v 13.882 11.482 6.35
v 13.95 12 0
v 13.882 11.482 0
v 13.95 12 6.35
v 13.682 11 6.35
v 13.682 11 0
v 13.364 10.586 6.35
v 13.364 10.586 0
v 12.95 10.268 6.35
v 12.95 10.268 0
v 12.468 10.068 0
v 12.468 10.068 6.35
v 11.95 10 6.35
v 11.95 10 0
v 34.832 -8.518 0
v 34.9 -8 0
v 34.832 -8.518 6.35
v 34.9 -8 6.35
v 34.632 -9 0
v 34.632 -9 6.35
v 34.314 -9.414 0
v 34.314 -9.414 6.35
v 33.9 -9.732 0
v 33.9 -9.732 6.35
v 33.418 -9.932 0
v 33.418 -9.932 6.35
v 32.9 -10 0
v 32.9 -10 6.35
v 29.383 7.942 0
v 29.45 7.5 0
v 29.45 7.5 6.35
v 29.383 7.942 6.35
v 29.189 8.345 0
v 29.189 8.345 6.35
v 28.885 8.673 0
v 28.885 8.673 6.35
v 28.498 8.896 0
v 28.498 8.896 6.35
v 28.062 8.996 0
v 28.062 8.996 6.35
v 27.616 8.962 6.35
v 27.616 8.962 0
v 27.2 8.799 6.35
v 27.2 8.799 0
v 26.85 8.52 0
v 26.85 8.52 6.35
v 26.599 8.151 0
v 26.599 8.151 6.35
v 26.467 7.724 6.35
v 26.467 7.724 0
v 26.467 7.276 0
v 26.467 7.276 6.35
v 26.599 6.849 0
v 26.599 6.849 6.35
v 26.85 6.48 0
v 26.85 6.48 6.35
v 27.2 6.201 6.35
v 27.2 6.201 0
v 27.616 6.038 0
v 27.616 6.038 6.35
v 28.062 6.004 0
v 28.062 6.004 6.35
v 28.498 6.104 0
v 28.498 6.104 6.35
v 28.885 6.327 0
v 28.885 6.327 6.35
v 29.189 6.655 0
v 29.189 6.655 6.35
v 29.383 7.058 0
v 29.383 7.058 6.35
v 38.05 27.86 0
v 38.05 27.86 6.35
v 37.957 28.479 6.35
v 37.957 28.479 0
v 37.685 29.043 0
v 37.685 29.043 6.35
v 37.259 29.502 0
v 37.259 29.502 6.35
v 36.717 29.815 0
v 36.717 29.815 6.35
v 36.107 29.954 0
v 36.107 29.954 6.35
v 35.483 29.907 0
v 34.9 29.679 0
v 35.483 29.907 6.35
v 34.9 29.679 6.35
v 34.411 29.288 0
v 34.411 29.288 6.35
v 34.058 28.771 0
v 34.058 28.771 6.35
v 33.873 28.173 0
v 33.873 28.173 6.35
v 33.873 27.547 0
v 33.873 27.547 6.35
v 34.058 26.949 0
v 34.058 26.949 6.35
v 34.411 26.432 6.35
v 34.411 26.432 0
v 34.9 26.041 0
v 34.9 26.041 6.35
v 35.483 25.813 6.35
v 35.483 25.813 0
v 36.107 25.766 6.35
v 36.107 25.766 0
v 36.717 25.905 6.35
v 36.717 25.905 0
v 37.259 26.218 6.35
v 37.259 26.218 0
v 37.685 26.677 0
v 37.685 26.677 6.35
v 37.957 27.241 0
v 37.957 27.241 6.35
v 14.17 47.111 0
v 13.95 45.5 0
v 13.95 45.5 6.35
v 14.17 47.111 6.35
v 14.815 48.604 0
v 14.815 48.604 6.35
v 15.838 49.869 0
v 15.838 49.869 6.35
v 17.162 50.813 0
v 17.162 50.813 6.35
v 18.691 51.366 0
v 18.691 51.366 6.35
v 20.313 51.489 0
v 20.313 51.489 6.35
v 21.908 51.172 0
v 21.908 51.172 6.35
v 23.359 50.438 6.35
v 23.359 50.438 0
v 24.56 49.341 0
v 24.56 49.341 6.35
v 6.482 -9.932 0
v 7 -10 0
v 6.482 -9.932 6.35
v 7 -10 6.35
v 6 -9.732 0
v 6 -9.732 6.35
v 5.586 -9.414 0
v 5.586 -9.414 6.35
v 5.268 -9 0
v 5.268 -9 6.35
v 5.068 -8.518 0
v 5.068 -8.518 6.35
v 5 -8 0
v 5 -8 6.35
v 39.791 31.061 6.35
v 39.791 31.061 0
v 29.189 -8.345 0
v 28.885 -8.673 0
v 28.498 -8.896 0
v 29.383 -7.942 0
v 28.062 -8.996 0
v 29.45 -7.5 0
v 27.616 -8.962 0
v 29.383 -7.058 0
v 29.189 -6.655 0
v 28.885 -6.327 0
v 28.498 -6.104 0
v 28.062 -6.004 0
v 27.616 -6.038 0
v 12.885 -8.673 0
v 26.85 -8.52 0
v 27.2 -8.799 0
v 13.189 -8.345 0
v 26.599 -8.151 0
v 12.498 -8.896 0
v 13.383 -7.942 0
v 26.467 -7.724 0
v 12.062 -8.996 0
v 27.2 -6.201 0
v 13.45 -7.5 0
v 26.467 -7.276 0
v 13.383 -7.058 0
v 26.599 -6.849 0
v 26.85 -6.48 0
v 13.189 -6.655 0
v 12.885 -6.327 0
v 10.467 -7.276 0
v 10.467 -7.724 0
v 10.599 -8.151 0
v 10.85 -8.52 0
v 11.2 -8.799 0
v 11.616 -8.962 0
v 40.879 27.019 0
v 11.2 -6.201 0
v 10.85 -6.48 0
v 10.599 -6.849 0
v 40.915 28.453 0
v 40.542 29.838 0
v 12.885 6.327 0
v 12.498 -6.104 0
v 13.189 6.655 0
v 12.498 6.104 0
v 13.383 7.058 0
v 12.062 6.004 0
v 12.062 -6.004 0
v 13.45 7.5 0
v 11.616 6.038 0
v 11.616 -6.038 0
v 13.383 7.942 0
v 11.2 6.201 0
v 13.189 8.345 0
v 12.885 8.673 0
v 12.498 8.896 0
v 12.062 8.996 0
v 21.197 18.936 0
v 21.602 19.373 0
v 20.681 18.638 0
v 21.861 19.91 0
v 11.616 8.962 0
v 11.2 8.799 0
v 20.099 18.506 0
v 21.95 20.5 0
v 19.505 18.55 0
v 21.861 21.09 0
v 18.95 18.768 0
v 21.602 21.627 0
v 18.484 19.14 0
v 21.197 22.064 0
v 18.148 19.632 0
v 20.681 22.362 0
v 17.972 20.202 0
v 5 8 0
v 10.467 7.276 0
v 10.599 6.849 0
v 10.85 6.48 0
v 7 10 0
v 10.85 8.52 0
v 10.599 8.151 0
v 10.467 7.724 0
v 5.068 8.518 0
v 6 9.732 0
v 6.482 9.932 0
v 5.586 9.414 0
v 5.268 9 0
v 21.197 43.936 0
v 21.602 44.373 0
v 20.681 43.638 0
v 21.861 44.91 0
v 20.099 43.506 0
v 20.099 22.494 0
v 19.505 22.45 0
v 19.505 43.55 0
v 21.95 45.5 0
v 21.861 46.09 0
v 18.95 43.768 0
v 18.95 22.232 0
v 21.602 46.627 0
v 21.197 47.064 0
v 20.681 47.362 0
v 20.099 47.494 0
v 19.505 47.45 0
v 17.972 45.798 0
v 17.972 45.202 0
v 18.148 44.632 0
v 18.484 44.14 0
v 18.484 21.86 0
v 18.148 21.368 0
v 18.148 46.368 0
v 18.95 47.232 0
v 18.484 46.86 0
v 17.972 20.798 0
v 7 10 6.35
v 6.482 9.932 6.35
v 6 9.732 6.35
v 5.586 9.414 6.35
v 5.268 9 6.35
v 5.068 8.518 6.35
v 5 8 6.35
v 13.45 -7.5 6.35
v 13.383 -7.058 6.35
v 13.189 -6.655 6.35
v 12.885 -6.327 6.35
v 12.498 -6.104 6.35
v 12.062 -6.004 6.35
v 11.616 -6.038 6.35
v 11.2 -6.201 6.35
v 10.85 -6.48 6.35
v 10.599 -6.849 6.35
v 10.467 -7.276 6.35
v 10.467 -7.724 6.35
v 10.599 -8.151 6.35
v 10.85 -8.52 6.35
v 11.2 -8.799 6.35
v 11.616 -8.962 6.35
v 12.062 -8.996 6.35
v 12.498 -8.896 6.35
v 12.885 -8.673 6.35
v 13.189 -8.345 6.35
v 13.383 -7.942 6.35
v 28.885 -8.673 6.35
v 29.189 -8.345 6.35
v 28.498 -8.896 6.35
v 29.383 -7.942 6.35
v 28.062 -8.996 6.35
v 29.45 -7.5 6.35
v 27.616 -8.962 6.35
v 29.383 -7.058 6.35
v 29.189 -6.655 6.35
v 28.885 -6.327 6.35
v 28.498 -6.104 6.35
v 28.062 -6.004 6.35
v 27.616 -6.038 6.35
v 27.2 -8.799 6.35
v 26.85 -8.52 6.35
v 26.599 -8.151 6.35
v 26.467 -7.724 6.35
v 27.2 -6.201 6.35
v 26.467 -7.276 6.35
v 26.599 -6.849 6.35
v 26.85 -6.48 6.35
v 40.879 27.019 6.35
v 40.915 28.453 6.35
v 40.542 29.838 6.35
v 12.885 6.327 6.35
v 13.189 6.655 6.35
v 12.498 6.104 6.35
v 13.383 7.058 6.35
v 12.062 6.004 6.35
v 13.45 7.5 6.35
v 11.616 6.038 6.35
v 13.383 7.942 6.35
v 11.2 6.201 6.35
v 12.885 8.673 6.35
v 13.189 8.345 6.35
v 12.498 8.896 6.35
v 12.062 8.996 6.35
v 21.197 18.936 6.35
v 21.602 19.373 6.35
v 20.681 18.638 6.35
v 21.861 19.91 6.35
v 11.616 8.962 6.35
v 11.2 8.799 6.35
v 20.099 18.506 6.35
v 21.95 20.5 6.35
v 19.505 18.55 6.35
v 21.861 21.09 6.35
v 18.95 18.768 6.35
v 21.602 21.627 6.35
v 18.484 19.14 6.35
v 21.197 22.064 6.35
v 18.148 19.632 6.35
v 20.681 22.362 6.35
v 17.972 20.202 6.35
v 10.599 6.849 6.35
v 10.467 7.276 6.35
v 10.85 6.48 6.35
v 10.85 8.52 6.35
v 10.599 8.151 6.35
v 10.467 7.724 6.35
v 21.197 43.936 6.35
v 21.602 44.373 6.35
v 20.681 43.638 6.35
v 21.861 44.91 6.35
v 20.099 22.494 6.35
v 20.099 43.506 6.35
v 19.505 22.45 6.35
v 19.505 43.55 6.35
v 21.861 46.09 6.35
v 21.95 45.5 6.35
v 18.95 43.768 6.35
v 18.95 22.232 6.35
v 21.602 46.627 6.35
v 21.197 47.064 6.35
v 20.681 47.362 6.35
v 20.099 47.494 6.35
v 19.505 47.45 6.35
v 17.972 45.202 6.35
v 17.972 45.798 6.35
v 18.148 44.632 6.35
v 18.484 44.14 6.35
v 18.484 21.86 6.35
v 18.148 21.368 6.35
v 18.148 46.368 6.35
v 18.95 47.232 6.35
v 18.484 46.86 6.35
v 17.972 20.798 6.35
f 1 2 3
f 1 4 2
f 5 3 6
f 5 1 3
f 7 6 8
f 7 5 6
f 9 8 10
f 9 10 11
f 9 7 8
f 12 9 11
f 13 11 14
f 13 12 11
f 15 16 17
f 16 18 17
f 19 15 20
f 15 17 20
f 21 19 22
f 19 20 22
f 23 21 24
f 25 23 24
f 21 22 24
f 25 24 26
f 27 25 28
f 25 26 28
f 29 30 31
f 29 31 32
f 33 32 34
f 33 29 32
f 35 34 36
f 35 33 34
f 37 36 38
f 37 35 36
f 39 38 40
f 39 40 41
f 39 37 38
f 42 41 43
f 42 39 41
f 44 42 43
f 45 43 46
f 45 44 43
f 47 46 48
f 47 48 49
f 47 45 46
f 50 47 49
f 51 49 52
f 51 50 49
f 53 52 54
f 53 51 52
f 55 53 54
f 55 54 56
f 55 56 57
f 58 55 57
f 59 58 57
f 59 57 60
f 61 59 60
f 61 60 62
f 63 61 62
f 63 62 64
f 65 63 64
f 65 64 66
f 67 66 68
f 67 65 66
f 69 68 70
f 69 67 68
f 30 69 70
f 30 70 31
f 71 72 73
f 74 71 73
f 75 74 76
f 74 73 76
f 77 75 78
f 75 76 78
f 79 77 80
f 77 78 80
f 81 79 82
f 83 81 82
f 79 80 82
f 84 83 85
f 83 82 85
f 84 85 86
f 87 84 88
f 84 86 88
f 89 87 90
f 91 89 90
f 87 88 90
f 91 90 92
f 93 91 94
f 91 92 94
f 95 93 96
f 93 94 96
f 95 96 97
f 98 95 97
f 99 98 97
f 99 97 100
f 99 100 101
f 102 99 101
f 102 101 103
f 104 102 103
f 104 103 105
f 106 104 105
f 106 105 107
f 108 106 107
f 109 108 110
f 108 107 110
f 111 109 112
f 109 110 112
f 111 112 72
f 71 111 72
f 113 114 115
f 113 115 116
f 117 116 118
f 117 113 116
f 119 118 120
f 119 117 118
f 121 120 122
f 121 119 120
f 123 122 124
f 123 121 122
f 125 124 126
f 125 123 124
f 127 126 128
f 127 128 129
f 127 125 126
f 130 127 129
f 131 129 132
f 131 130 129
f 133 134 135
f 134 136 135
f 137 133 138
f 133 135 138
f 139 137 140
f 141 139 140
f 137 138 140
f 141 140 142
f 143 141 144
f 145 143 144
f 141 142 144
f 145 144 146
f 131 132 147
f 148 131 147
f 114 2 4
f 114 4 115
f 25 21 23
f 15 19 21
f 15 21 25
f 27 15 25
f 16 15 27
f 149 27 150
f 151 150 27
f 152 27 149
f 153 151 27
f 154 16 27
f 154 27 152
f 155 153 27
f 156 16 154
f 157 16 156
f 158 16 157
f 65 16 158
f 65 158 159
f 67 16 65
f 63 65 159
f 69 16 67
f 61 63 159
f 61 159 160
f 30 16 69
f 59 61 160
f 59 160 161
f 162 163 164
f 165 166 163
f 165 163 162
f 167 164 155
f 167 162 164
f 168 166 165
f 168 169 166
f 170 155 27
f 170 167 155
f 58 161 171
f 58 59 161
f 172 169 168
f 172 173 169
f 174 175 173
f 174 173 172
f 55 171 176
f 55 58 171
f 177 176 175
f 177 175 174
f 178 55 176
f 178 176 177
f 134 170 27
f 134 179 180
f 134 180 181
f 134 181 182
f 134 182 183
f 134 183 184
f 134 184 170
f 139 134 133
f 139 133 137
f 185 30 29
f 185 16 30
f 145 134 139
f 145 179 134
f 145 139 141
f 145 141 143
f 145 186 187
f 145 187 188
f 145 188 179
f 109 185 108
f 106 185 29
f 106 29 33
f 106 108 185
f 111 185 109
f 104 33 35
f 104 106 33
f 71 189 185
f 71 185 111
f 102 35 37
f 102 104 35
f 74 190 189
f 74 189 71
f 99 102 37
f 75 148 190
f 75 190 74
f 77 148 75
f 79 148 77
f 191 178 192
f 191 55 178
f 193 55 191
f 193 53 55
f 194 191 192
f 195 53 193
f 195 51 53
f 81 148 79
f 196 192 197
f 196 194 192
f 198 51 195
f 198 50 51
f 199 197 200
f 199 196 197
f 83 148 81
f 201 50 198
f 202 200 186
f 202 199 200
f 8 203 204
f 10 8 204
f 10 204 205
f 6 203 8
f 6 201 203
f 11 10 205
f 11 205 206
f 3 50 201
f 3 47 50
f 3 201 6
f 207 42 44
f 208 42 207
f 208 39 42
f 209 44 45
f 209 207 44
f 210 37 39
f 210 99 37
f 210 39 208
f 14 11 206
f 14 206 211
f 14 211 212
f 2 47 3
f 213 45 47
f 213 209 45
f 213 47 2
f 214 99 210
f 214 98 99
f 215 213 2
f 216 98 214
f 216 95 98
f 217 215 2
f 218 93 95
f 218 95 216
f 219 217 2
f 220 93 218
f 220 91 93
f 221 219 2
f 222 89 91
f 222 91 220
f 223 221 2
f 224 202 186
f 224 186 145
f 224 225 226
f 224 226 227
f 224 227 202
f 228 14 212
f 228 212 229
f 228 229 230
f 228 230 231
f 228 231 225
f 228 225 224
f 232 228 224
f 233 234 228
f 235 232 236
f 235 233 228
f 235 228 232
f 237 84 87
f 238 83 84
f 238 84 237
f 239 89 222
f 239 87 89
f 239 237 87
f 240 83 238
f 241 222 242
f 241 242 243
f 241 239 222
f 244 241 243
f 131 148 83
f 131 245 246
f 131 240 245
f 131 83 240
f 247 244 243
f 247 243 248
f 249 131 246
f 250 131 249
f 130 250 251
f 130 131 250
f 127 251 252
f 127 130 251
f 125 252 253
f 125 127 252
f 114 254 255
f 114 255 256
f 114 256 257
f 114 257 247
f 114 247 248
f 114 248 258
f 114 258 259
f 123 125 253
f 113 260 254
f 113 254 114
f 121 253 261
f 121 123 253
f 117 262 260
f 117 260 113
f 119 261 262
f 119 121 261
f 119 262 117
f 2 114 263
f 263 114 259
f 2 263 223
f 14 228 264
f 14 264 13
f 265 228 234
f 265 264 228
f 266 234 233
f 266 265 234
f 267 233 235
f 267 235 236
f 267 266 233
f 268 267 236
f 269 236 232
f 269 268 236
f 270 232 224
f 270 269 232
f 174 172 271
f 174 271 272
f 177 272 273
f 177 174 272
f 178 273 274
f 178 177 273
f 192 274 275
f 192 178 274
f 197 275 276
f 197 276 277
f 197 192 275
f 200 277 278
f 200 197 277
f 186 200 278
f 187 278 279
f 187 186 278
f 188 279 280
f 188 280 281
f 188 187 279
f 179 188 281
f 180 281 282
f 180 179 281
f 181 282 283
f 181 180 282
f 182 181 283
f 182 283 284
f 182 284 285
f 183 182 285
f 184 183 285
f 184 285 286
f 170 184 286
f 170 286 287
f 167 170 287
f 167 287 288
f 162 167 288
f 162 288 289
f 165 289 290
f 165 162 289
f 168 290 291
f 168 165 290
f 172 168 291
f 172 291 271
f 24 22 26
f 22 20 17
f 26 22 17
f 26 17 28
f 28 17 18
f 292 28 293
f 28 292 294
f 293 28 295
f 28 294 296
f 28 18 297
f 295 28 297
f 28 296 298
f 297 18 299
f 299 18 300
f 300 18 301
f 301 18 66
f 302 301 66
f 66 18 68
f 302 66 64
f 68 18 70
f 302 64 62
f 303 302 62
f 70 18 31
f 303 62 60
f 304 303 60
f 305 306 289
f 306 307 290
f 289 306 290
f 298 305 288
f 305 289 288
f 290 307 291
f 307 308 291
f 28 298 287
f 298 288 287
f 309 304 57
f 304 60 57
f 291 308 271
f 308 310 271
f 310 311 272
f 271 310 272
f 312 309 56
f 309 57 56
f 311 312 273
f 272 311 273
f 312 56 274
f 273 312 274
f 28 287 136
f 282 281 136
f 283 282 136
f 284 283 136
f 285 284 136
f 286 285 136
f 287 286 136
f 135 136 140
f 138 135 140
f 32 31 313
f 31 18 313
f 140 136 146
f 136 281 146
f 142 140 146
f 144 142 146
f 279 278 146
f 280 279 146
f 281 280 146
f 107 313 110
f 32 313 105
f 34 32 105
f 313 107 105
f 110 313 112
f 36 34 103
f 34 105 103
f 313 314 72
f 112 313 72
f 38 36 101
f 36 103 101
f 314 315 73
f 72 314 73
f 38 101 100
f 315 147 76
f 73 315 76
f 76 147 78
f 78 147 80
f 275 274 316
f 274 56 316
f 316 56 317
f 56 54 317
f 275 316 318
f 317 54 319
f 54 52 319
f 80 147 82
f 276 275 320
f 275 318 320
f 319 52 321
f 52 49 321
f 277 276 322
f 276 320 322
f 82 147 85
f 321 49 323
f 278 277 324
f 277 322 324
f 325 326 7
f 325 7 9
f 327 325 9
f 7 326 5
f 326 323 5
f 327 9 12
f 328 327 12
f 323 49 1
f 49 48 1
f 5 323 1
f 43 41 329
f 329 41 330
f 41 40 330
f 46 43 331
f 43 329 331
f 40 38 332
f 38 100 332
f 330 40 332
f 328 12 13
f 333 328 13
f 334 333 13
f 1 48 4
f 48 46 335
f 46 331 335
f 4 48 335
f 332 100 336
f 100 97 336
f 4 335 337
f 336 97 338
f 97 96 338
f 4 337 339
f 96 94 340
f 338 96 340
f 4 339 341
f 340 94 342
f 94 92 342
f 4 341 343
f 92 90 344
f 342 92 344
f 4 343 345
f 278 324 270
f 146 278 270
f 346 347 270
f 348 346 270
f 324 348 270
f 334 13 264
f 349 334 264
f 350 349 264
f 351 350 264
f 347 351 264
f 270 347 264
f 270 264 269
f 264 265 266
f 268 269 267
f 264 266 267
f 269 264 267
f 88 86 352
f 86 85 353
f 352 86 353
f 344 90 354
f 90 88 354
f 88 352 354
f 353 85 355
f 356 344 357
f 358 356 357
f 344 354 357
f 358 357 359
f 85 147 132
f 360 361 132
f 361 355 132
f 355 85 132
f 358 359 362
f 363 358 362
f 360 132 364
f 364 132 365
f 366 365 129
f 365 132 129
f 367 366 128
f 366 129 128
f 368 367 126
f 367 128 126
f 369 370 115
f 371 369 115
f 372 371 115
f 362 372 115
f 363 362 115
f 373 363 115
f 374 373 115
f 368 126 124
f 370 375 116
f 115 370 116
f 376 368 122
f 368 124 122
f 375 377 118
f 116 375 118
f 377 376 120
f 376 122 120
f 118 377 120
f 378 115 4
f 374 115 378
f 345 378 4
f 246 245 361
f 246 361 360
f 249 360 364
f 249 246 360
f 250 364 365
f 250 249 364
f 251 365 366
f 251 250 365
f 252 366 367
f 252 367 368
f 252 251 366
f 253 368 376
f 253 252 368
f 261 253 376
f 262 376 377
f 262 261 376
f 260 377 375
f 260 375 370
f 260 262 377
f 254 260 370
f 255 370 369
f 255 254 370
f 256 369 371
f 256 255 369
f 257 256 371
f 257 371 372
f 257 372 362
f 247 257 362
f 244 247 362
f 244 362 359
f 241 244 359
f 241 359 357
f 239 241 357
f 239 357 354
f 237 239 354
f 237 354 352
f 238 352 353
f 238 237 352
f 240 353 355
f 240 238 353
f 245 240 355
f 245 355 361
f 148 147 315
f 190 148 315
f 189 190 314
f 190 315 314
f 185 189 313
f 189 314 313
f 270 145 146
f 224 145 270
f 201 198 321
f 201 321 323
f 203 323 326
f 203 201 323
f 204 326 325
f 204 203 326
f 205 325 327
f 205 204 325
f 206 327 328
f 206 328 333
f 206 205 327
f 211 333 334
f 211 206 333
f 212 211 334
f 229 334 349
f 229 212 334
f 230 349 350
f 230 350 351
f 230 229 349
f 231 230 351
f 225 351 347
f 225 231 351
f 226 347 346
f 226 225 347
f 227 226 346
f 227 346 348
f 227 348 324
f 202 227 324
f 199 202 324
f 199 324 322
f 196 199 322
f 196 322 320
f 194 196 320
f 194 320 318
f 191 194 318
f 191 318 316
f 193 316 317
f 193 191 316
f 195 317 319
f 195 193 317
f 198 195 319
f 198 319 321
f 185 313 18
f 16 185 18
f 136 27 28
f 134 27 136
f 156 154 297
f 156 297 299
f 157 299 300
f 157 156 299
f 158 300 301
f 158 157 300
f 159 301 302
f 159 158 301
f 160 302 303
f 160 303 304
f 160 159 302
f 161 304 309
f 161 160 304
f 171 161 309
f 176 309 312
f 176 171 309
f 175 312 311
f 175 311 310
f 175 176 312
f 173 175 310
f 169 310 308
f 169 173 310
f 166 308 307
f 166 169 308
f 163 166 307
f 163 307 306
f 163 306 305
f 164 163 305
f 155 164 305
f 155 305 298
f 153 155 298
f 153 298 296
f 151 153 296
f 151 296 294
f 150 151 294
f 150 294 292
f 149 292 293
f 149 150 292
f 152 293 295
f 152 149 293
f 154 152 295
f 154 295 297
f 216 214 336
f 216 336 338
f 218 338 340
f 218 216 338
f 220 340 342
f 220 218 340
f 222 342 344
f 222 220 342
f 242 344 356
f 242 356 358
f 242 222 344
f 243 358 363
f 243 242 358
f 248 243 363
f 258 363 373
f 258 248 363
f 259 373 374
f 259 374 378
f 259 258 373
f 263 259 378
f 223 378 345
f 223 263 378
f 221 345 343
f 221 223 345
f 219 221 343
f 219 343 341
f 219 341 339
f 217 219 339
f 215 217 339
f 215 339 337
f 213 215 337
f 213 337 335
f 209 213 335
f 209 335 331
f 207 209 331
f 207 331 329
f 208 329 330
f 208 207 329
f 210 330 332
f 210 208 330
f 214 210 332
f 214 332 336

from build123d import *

# Parameters (mm, degrees)
SKETCH1_R           = 1.5
SKETCH1_R_2         = 2
BOSS_EXTRUDE1_DEPTH = 6.35
FILLET1_R           = 2
SKETCH2_R           = 2.1
BOSS_EXTRUDE2_DEPTH = 6.35


with BuildPart() as part:
    # Sketch1 → Boss-Extrude1 (new body)
    with BuildSketch(Plane.XY):
        with BuildLine():
            Line((25.95, 45.499996), (25.95, 9.999996))
            Line((25.95, 9.999996), (34.9, 9.999996))
            Line((34.9, 9.999996), (34.9, -10))
            Line((34.9, -10), (5, -10))
            Line((5, -10), (5, 9.999996))
            Line((5, 9.999996), (13.95, 9.999996))
            Line((13.95, 9.999996), (13.95, 45.499996))
            ThreePointArc((13.95, 45.499996), (19.95, 51.499996), (25.95, 45.499996))
        make_face()
        with Locations((27.95, -7.5)):
            Circle(SKETCH1_R, mode=Mode.SUBTRACT)
        with Locations((11.95, -7.5)):
            Circle(SKETCH1_R, mode=Mode.SUBTRACT)
        with Locations((27.95, 7.5)):
            Circle(SKETCH1_R, mode=Mode.SUBTRACT)
        with Locations((11.95, 7.5)):
            Circle(SKETCH1_R, mode=Mode.SUBTRACT)
        with Locations((19.95, 45.499996)):
            Circle(SKETCH1_R_2, mode=Mode.SUBTRACT)
        with Locations((19.95, 20.499996)):
            Circle(SKETCH1_R_2, mode=Mode.SUBTRACT)
    extrude(amount=BOSS_EXTRUDE1_DEPTH)

    # Fillet1
    fillet1_edges = [part.edges().sort_by_distance(p)[0] for p in [
        (5, 9.999996, 3.175),
        (13.95, 9.999996, 3.175),
        (25.95, 9.999996, 3.175),
        (34.9, 9.999996, 3.175),
        (34.9, -10, 3.175),
        (5, -10, 3.175),
    ]]
    fillet(fillet1_edges, radius=FILLET1_R)

    # Sketch2 → Boss-Extrude2 (add)
    with BuildSketch(Plane.XY.offset(6.35)):
        with BuildLine():
            Line((24.559539107, 49.340848668), (39.791282589, 31.060710557))
            ThreePointArc((39.791282589, 31.060710557), (40.778341906, 29.158889693), (40.87868421, 27.018529882))
            Line((40.87868421, 27.018529882), (34.9, -8))
            Line((34.9, -8), (34.9, 7.999996))
            ThreePointArc((34.9, 7.999996), (34.314213562, 9.414209562), (32.9, 9.999996))
            Line((32.9, 9.999996), (27.95, 9.999996))
            ThreePointArc((27.95, 9.999996), (26.535786438, 10.585782437), (25.95, 11.999996))
            Line((25.95, 11.999996), (25.95, 45.499996))
            ThreePointArc((25.95, 45.499996), (25.591685681, 47.542392308), (24.559539107, 49.340848668))
        make_face()
        with Locations((35.95, 27.86)):
            Circle(SKETCH2_R, mode=Mode.SUBTRACT)
    extrude(amount=-BOSS_EXTRUDE2_DEPTH)


solid = part.part
